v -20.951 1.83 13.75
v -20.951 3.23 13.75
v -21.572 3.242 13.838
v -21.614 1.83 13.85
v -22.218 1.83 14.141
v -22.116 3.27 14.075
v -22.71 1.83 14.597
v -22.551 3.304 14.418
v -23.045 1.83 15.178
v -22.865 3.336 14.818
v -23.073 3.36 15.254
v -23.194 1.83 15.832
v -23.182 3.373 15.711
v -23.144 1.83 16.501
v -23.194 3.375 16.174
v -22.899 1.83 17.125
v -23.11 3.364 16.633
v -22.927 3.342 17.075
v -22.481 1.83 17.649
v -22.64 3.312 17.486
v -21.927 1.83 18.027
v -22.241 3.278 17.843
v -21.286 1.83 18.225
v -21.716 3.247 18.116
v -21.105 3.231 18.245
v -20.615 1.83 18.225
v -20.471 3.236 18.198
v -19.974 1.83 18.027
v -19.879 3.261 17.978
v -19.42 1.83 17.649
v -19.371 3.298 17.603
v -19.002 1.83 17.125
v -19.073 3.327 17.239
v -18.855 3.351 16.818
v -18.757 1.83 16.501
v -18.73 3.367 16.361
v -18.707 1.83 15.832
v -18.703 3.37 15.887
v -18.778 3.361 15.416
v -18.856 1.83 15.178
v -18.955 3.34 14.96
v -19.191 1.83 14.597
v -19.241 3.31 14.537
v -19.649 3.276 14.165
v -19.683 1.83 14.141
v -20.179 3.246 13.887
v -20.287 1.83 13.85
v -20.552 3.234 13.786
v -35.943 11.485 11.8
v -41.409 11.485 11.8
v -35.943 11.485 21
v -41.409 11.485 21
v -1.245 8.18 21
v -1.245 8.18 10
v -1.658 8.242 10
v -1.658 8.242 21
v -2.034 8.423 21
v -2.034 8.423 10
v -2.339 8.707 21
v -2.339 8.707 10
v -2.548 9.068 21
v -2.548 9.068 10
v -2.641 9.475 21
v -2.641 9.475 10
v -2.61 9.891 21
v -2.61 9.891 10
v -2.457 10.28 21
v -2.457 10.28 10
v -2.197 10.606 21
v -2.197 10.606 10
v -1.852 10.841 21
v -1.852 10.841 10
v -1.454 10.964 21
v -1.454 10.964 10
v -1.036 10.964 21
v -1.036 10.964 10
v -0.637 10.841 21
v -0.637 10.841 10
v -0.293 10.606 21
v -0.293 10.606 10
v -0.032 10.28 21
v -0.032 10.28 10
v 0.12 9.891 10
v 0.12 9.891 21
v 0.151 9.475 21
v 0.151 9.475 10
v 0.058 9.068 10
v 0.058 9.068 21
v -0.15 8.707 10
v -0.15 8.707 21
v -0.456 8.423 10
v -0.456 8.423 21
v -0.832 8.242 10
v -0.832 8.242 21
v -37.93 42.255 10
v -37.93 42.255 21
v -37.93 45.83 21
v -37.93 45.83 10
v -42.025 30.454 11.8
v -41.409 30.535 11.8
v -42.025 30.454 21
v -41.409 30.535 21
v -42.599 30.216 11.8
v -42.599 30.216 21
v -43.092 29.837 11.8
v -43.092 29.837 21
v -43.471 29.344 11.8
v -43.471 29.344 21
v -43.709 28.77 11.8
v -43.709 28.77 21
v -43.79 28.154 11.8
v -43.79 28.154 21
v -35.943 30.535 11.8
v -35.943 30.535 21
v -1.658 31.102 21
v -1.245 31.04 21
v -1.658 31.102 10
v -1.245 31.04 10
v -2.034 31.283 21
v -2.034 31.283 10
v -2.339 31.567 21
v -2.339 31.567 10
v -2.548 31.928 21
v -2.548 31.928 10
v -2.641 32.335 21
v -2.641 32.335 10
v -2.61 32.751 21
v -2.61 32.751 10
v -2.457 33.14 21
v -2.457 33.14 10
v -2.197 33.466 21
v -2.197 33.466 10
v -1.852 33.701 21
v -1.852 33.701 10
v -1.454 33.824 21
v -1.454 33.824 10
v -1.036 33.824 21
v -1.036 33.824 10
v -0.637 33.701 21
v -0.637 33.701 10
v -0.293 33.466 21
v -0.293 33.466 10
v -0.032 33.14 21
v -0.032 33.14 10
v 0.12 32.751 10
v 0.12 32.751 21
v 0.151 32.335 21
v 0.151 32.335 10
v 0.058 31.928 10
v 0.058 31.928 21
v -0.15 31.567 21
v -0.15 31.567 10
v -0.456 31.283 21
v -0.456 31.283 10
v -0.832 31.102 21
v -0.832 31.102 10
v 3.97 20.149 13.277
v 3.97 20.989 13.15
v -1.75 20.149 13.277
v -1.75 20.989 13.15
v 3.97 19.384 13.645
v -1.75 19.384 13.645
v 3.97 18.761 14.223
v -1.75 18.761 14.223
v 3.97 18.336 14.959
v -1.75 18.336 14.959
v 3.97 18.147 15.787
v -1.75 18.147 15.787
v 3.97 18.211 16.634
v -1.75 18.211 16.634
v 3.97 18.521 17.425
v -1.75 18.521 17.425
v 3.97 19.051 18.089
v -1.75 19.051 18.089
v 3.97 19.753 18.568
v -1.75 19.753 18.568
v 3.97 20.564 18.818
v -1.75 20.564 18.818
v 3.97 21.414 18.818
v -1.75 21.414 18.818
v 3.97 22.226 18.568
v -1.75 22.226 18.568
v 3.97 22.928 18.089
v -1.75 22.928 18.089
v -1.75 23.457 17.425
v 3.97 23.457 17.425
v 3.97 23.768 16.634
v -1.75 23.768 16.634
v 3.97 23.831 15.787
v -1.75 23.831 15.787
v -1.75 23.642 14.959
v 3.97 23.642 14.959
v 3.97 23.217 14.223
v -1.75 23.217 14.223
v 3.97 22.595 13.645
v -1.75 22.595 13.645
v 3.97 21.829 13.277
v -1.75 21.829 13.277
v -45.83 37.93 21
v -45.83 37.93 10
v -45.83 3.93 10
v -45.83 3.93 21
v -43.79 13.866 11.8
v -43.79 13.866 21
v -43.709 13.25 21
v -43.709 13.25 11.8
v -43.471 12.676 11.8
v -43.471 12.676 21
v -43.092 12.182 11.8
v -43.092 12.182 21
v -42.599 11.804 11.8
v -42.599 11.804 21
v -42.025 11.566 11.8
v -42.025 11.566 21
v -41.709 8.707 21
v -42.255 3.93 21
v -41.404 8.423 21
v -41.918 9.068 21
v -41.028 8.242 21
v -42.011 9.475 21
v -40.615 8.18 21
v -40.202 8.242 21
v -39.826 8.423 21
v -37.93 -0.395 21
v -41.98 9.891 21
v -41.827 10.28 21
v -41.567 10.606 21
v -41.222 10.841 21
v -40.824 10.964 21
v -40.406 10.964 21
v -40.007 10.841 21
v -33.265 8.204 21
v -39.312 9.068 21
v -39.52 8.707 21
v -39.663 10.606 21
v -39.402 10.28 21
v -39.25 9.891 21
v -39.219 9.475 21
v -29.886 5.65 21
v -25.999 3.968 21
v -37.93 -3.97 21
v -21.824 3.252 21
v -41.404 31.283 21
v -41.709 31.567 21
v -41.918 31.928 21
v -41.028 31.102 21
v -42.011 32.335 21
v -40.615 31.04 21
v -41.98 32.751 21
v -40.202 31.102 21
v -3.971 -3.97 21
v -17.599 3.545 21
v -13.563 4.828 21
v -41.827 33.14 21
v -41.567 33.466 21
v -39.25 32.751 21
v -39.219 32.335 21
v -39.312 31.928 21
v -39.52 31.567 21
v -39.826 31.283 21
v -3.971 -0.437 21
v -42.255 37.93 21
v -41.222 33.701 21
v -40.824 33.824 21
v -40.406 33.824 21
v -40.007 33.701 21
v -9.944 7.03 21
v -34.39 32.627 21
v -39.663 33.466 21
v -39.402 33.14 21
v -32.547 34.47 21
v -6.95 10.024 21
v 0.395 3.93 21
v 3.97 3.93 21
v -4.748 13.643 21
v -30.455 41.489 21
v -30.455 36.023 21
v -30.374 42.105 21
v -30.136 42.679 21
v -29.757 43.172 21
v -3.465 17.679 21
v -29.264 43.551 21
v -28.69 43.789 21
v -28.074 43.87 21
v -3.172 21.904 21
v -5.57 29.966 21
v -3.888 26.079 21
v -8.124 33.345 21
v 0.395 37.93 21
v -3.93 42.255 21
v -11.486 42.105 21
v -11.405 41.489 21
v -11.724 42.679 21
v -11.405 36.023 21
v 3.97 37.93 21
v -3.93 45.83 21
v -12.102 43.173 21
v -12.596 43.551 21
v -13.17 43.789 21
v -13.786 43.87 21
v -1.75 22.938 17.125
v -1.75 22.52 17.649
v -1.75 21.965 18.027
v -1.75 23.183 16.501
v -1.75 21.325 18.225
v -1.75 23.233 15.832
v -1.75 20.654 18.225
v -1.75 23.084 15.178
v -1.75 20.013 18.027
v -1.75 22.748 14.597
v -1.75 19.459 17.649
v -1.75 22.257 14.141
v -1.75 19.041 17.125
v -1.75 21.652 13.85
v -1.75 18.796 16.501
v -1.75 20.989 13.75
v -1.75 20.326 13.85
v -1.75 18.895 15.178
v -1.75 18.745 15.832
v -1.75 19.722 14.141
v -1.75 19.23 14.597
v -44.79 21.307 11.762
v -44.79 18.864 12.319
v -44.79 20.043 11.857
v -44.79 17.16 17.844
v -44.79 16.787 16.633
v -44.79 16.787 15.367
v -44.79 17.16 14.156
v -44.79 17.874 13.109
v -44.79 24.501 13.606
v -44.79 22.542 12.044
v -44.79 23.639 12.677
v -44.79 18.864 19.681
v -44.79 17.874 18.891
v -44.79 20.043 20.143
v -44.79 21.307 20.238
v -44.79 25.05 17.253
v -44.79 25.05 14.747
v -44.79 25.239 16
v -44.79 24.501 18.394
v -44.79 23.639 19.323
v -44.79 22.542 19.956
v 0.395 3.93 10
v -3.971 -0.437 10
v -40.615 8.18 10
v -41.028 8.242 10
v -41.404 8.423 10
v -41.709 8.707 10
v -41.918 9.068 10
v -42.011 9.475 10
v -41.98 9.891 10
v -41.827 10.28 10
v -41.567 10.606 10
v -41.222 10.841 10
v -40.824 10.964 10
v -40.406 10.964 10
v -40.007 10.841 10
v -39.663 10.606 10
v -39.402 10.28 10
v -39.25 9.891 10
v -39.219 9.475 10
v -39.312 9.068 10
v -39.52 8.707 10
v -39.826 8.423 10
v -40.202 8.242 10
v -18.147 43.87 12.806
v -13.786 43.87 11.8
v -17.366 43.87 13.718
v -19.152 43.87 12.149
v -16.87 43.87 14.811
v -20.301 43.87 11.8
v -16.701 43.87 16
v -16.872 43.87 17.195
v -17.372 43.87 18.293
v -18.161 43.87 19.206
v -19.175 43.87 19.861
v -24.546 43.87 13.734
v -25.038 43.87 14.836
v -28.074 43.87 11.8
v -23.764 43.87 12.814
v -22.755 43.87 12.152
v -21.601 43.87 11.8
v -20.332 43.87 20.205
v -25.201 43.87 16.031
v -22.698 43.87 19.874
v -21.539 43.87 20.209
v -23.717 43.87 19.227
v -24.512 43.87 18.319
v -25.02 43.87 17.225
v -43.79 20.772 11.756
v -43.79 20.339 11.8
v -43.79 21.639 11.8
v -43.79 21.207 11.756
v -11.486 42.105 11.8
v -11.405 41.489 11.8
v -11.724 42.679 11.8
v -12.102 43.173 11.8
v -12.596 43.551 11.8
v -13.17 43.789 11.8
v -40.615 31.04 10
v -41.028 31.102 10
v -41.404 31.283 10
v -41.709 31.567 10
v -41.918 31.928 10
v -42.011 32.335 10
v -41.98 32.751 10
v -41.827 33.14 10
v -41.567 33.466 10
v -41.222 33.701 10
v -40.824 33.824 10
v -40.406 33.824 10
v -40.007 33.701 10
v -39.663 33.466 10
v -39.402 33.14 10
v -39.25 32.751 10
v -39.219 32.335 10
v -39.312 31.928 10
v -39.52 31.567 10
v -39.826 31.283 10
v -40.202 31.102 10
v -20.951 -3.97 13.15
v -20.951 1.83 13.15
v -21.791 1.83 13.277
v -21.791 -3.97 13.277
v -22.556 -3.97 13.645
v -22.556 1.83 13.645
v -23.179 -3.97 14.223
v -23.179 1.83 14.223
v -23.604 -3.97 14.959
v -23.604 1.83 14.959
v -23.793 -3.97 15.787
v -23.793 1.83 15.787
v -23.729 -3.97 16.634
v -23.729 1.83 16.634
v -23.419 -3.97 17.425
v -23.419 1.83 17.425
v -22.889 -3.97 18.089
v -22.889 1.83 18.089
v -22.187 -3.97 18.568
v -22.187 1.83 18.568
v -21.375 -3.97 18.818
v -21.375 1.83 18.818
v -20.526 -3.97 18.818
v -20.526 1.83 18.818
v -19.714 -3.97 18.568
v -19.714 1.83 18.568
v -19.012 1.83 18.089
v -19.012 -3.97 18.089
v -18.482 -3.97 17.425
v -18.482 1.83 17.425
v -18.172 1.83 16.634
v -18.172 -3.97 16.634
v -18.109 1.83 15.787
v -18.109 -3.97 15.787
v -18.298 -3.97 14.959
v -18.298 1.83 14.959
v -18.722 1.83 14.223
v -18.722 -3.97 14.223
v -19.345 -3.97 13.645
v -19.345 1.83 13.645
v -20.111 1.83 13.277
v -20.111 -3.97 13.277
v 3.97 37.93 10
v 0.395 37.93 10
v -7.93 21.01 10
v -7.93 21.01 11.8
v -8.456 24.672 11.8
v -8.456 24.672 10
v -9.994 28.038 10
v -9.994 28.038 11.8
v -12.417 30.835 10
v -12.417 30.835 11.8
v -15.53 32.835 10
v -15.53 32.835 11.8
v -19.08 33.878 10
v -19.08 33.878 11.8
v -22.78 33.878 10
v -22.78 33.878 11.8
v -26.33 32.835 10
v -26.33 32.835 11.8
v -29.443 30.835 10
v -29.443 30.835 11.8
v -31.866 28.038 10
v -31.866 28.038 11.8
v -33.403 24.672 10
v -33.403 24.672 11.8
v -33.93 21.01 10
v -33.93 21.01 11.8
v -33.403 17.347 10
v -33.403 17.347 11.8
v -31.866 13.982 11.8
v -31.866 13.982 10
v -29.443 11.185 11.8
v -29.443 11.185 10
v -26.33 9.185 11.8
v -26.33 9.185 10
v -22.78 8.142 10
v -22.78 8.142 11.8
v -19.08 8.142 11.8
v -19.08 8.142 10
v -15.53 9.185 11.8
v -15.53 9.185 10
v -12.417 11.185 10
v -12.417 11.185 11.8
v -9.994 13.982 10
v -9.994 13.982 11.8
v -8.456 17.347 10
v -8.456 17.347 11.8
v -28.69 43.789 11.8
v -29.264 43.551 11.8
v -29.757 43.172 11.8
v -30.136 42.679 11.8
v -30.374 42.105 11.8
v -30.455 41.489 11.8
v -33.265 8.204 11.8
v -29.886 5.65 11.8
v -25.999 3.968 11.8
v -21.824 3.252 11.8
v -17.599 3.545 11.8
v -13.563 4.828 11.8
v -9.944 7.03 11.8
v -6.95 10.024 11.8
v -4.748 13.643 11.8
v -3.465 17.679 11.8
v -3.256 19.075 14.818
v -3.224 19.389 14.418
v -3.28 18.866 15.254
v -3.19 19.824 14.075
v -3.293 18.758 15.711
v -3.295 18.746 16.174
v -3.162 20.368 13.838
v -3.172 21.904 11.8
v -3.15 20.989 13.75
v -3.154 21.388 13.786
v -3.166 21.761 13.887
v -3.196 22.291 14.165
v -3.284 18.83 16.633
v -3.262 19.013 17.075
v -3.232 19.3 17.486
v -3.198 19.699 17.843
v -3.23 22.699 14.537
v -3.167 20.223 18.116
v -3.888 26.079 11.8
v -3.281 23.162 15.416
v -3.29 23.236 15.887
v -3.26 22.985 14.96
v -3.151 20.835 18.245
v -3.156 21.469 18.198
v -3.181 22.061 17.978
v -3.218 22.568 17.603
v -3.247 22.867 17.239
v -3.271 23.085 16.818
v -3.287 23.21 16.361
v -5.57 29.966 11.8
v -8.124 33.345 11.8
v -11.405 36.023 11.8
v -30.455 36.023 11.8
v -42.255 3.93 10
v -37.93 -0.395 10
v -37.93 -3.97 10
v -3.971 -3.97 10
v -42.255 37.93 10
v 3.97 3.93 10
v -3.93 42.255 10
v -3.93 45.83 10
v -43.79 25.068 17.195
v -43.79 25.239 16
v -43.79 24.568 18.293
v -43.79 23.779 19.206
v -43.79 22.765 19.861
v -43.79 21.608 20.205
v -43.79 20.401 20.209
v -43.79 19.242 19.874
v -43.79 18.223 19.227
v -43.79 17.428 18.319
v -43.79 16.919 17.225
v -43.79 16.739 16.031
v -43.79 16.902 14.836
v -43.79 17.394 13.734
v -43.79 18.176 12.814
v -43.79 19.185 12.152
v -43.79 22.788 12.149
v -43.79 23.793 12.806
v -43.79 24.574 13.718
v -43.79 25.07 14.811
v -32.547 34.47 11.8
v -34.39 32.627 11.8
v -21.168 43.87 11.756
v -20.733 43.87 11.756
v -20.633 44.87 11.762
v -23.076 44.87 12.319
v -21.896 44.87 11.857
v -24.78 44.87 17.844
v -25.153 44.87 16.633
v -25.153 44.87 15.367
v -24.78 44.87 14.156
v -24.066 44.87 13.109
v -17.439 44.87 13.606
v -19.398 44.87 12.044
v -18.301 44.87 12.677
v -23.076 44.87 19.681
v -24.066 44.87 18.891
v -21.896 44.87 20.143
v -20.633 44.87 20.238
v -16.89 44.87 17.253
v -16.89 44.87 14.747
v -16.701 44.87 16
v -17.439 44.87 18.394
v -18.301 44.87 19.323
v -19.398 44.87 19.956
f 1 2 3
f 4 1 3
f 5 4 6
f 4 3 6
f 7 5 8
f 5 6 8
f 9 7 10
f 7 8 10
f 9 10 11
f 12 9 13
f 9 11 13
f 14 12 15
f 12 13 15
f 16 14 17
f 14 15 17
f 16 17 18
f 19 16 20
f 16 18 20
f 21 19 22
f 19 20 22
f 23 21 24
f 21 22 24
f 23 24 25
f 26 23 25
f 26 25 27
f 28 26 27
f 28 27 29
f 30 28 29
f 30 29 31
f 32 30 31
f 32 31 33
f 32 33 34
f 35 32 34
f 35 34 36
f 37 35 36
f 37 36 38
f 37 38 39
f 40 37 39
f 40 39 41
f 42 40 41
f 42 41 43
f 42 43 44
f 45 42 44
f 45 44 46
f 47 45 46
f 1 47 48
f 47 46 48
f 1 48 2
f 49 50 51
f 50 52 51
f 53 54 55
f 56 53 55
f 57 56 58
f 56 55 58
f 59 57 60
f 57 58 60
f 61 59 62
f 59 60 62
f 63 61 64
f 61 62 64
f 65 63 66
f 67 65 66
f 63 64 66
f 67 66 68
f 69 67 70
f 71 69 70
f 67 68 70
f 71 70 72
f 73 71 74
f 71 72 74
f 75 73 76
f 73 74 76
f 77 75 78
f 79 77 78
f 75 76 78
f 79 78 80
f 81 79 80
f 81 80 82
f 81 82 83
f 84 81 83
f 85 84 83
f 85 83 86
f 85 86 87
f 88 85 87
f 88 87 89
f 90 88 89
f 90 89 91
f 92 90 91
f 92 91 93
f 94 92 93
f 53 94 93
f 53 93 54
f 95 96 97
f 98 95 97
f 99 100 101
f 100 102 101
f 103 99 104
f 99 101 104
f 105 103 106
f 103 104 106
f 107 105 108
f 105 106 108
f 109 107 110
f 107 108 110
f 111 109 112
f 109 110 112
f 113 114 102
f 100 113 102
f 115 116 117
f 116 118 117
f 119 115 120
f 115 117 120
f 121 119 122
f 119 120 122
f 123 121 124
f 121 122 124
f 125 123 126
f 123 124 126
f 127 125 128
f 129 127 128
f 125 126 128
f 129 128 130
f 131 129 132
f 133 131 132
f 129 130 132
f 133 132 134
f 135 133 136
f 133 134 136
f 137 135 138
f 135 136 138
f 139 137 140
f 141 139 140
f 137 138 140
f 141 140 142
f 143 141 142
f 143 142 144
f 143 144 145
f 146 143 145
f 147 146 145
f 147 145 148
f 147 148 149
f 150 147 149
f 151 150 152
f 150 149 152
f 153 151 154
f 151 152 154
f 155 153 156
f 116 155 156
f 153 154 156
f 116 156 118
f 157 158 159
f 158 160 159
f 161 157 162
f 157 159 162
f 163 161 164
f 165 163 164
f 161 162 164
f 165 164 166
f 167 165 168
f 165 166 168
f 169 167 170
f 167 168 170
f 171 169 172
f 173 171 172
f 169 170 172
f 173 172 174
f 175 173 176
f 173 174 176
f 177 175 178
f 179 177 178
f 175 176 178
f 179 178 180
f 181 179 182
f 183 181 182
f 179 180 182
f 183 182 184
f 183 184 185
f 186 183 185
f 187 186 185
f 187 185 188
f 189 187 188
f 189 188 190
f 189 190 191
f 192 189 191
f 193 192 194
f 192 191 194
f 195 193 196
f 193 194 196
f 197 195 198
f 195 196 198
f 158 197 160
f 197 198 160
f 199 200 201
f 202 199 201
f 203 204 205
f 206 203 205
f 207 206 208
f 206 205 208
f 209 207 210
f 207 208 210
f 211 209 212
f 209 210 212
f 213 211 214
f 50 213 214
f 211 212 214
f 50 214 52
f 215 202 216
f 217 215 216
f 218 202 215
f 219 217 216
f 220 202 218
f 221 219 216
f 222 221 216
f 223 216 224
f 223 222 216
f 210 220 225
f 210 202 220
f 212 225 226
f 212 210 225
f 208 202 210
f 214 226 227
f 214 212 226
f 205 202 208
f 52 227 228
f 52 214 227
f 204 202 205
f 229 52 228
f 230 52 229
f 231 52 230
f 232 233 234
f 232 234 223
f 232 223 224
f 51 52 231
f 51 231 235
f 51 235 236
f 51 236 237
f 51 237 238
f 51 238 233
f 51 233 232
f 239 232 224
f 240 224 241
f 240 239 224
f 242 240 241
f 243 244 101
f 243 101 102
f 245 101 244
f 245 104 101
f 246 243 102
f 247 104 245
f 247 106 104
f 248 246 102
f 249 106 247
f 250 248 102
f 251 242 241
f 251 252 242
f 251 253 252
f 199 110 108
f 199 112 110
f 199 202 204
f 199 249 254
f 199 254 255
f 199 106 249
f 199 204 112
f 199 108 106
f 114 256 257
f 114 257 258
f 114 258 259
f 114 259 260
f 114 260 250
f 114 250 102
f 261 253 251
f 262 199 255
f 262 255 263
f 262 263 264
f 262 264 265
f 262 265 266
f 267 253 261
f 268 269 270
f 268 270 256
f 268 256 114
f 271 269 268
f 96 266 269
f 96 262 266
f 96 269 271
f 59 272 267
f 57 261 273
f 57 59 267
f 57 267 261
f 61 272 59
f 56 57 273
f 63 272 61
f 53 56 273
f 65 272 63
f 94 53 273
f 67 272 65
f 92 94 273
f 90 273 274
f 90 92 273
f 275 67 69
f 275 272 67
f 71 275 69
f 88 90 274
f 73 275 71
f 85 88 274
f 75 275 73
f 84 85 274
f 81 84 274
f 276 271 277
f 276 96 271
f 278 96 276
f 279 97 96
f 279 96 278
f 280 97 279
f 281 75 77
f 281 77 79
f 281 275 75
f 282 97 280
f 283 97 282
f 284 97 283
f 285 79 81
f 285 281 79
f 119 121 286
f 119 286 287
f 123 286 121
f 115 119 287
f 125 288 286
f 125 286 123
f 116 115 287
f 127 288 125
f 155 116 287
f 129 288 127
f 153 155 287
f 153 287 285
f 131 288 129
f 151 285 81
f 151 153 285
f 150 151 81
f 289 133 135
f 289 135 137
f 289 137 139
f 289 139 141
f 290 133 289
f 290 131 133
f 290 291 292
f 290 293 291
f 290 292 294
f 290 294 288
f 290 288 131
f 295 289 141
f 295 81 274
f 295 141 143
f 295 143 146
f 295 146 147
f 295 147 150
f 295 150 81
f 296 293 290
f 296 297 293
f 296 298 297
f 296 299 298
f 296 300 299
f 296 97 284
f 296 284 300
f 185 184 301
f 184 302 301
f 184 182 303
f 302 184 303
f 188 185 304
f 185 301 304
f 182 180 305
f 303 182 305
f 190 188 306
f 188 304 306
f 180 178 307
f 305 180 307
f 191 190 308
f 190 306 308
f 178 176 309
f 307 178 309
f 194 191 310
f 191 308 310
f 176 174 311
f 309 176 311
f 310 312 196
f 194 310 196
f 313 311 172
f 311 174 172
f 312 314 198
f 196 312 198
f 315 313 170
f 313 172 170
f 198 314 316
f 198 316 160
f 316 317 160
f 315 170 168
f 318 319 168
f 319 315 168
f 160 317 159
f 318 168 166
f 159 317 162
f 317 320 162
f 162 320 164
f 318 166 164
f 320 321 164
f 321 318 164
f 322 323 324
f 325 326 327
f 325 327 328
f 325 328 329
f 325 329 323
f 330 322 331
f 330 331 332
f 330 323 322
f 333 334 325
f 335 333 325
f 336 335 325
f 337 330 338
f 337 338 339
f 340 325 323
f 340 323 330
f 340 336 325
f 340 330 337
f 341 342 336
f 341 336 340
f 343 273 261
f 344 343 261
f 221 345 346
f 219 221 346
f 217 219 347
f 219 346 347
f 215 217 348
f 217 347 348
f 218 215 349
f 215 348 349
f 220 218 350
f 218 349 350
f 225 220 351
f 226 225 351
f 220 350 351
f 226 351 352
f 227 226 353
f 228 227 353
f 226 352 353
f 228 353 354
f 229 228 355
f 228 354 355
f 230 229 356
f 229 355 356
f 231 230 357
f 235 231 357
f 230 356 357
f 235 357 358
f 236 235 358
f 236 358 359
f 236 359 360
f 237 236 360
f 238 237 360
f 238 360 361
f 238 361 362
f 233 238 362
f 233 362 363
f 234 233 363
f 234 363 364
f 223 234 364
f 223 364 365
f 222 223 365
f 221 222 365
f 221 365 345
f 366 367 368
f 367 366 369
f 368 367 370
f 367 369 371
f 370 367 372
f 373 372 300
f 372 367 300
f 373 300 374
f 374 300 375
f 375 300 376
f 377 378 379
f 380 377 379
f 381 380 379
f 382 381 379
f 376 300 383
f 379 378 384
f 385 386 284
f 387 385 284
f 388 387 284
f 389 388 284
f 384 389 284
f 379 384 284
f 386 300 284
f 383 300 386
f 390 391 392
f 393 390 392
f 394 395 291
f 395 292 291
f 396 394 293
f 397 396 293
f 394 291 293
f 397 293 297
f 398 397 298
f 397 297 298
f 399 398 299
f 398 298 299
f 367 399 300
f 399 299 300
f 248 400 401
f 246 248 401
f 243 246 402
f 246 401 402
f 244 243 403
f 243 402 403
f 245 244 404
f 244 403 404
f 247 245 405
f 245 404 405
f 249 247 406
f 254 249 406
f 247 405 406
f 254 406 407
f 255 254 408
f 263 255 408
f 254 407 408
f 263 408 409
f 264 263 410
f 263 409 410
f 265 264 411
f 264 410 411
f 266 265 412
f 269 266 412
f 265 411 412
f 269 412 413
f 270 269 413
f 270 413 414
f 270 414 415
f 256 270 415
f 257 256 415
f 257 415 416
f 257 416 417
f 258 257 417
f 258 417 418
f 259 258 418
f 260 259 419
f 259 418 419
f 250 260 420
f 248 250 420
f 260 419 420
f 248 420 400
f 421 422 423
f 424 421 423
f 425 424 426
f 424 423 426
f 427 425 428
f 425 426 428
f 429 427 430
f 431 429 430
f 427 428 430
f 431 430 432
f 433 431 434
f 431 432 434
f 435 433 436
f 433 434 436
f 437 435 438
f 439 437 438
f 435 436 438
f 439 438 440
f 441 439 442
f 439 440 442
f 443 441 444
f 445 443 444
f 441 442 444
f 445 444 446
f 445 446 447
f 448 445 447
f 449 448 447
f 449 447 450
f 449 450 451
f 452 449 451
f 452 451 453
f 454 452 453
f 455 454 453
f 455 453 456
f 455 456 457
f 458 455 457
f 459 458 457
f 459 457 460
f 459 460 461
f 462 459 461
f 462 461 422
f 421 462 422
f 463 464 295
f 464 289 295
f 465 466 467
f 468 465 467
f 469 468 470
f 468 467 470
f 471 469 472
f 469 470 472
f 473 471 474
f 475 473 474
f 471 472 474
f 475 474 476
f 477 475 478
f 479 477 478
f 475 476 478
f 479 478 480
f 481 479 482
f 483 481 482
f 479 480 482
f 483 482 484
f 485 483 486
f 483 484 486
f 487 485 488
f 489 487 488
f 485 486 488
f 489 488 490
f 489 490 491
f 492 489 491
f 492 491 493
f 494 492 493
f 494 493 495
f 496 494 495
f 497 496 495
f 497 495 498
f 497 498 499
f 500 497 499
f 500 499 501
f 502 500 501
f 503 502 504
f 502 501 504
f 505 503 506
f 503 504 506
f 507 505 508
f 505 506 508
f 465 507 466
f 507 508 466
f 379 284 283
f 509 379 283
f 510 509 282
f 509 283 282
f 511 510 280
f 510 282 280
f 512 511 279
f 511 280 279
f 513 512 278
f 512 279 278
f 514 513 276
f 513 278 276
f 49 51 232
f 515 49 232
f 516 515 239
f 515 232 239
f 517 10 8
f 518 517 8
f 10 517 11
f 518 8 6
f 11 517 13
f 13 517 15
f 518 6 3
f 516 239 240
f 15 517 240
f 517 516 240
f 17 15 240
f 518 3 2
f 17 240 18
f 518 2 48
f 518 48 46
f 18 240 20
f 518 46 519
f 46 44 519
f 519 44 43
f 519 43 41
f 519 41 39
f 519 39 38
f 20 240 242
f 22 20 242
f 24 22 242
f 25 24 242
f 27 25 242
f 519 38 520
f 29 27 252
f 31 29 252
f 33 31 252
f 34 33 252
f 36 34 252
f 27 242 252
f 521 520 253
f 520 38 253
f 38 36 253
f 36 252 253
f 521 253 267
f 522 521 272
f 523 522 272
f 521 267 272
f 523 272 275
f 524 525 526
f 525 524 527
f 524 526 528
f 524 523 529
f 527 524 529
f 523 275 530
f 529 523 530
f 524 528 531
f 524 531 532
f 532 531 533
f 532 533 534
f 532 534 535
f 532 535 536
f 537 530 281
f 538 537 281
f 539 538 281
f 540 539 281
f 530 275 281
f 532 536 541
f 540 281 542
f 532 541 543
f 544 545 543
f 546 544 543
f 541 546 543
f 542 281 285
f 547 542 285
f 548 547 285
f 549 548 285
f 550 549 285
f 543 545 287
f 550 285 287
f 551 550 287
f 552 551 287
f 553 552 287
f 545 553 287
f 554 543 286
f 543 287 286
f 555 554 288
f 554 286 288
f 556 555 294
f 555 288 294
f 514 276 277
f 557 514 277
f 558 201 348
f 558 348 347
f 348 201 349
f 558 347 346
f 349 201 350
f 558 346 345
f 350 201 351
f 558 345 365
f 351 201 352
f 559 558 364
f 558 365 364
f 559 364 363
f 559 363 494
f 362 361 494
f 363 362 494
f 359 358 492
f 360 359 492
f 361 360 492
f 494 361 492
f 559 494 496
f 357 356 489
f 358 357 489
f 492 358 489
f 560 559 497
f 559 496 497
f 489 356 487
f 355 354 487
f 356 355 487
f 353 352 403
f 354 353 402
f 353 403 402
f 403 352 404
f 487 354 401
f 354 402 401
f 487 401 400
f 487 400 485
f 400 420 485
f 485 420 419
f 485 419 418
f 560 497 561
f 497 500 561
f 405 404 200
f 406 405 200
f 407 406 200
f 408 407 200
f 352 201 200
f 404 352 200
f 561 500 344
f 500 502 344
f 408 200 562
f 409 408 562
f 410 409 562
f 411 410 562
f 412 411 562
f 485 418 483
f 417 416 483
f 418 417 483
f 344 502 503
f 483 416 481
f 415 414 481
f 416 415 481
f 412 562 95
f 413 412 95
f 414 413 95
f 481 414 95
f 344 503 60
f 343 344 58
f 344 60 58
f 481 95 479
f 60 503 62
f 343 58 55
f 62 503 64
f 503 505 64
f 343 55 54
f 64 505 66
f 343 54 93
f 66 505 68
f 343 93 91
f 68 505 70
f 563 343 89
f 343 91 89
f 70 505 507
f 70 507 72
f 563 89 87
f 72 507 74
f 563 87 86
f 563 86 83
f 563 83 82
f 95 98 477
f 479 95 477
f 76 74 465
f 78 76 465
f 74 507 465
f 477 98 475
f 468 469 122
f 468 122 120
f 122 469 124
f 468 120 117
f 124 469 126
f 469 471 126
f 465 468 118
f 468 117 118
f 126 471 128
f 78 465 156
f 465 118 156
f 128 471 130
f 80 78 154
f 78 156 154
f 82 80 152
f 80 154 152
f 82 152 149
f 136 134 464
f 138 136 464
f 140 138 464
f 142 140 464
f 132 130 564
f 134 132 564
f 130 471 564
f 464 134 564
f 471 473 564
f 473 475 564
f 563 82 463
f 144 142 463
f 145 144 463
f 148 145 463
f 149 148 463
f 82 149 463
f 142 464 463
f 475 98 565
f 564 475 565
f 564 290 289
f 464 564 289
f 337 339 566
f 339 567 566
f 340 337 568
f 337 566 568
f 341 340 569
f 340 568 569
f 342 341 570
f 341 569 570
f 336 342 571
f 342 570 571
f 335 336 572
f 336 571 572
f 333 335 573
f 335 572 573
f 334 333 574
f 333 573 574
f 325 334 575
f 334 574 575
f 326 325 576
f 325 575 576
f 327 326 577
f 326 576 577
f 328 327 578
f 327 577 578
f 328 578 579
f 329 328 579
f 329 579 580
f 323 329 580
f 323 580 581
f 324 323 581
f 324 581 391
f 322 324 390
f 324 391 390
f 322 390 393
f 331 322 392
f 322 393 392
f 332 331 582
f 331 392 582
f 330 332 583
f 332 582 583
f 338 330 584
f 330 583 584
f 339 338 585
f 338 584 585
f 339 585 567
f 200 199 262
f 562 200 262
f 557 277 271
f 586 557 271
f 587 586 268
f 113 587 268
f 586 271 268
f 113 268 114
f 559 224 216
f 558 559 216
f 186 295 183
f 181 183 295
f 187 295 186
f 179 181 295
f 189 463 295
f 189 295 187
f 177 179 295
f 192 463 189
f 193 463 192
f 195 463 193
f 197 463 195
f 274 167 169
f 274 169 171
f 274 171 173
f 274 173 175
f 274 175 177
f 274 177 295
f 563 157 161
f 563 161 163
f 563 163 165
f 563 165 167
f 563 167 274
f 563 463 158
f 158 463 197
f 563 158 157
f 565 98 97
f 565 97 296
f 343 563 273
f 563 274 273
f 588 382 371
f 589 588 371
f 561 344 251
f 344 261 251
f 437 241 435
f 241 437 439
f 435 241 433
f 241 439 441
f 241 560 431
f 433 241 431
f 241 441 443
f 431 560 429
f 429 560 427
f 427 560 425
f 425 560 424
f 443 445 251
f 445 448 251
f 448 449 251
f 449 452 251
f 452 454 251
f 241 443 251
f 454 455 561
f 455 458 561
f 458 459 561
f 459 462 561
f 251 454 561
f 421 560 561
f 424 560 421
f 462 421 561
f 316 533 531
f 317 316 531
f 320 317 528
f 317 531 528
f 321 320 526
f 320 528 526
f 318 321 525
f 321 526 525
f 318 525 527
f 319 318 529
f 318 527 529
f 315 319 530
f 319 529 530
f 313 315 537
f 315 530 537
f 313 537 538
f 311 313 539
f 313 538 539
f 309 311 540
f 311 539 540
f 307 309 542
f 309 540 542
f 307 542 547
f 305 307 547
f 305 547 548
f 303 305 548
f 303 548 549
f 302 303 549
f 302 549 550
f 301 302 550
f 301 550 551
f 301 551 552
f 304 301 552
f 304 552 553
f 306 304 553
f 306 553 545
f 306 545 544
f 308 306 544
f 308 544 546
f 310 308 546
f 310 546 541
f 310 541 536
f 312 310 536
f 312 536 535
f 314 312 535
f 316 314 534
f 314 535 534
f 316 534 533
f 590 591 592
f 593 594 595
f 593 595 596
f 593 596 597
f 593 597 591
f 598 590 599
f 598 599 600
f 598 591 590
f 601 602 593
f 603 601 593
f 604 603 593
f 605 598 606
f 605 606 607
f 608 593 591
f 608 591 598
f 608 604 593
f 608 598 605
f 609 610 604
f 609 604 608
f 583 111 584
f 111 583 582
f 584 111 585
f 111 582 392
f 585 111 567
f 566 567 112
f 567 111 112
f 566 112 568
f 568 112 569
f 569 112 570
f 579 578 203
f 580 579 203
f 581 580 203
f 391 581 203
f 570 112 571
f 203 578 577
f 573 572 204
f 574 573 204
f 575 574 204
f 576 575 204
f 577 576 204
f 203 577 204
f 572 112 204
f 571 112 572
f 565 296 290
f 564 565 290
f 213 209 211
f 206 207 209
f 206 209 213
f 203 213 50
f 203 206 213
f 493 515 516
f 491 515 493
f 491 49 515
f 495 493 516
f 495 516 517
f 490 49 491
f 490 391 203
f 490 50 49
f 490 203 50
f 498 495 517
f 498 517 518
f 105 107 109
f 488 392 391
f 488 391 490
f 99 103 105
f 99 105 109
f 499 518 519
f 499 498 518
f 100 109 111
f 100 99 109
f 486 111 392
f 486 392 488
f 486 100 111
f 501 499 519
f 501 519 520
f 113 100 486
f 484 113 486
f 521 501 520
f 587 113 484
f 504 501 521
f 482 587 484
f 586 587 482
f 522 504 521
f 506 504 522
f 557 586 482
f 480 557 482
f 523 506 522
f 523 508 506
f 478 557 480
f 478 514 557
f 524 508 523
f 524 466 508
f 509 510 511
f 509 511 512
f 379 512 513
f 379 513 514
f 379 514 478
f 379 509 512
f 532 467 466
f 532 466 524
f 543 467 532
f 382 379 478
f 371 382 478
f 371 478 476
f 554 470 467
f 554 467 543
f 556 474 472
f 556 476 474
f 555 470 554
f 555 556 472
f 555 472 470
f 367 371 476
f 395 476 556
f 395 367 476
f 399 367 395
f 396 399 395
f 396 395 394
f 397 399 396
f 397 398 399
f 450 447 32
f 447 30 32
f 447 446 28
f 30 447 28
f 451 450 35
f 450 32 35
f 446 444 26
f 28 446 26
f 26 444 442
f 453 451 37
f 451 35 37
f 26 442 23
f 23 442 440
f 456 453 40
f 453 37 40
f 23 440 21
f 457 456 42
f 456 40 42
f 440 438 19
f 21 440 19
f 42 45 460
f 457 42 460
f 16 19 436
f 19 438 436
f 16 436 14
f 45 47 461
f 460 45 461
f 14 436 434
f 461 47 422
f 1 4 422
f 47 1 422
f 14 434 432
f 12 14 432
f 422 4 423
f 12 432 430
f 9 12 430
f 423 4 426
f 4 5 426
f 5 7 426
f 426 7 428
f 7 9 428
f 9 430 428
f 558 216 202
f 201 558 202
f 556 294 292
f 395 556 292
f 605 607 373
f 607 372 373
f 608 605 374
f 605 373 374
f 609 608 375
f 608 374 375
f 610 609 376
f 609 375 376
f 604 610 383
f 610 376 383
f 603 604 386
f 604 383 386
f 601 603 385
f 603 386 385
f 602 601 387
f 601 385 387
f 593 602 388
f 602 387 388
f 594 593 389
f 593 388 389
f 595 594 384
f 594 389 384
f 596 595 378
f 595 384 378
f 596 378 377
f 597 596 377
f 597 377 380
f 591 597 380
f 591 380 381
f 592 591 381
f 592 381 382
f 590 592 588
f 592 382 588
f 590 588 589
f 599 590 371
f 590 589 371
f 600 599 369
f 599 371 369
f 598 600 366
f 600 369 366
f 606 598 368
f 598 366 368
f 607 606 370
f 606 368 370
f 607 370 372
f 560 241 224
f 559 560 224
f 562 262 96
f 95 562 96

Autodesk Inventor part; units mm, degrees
ref_plane "YZ Plane" through (0, 0, 0) normal (1, 0, 0) x (0, 1, 0)
ref_plane "XZ Plane" through (0, 0, 0) normal (0, 1, 0) x (-1, 0, 0)
ref_plane "Work Plane1" through (0, 0, 10) normal (0, 0, 1) x (1, 0, 0)
sketch "Sketch1" plane through (0, 0, 10) normal (0, 0, 1) x (1, 0, 0)
  line L0 (-4.0299, -0.3538) -> (-2.2322, 1.4439) construction
  arc A0 (-1.4439, 2.2322) -> (-2.2322, 1.4439) centre (-0.9299, 0.9299) ccw construction
  line L1 (-1.4439, 2.2322) -> (0.3538, 4.0299) construction
  line L2 (-37.8299, 42.8299) -> (-37.8299, 37.8299) construction
  line L3 (-37.8299, 37.8299) -> (-42.9208, 37.8299) construction
  line L4 (-37.8299, 42.2137) -> (-37.8299, 45.8299) construction
  line L5 (-37.8299, 45.8299) -> (-4.0299, 45.8299) construction
  line L6 (-4.0299, 45.8299) -> (-4.0299, 42.2137) construction
  line L7 (-4.0299, 4.0299) -> (0.3538, 4.0299) projected
  circle A1 centre (-20.9299, 20.9299) radius 17.5 projected
  line L8 (-20.9299, 58.9723) -> (17.1124, 20.9299) construction
  line L9 (17.1124, 20.9299) -> (-20.9299, -17.1124) construction
  line L10 (-20.9299, -17.1124) -> (-58.9723, 20.9299) construction
  line L11 (-58.9723, 20.9299) -> (-20.9299, 58.9723) construction
  line L12 (-20.9299, 58.9723) -> (-20.9299, -17.1124) construction
  line L13 (17.1124, 20.9299) -> (-58.9723, 20.9299) construction
  line L14 (-20.9299, 58.9723) -> (32.8701, 58.9723) construction
  line L15 (-43.4299, 43.4299) -> (1.5701, 43.4299) construction
  line L16 (1.5701, 43.4299) -> (1.5701, -1.5701) construction
  line L17 (1.5701, -1.5701) -> (-43.4299, -1.5701) construction
  line L18 (-43.4299, -1.5701) -> (-43.4299, 43.4299) construction
  line L19 (-43.4299, 43.4299) -> (1.5701, -1.5701) construction
  line L20 (1.5701, 43.4299) -> (-43.4299, -1.5701) construction
  line L21 (-43.4299, 5.3876) -> (-43.4299, 36.4723)
  line L22 (-43.4299, 36.4723) -> (-36.4723, 43.4299)
  line L23 (-36.4723, 43.4299) -> (-5.3876, 43.4299)
  line L24 (-5.3876, 43.4299) -> (1.5701, 36.4723)
  line L25 (1.5701, 36.4723) -> (1.5701, 5.3876)
  line L26 (1.5701, 5.3876) -> (-5.3876, -1.5701)
  line L27 (-5.3876, -1.5701) -> (-36.4723, -1.5701)
  line L28 (-36.4723, -1.5701) -> (-43.4299, 5.3876)
  line L29 (-4.0299, 42.2137) -> (-37.8299, 42.2137) projected
  line L30 (-4.0299, -0.3538) -> (-4.0299, 4.0299) projected
  circle A2 centre (-20.9299, 20.9299) radius 1.5
  line L31 (-10.9299, 10.9299) -> (-30.9299, 10.9299) construction
  line L32 (-30.9299, 10.9299) -> (-30.9299, 30.9299) construction
  line L33 (-30.9299, 30.9299) -> (-10.9299, 30.9299) construction
  line L34 (-10.9299, 30.9299) -> (-10.9299, 10.9299) construction
  line L35 (-10.9299, 10.9299) -> (-30.9299, 30.9299) construction
  line L36 (-30.9299, 10.9299) -> (-10.9299, 30.9299) construction
  circle A3 centre (-30.9299, 30.9299) radius 1.4
  circle A4 centre (-30.9299, 10.9299) radius 1.4
  circle A5 centre (-10.9299, 10.9299) radius 1.4
  line L37 (-45.8299, 37.8299) -> (-42.0723, 37.8299) construction
  line L38 (-42.1723, 37.7299) -> (-45.8299, 37.7299)
  line L39 (-45.8299, 37.7299) -> (-45.8299, 4.1299)
  line L40 (-45.8299, 4.1299) -> (-42.1723, 4.1299)
  line L41 (-42.1723, 4.1299) -> (-42.1723, 37.7299)
  line L42 (-45.8299, 4.0299) -> (-42.0723, 4.0299) construction
  line L43 (-45.8299, 37.8299) -> (-42.0723, 37.8299) projected
  line L44 (-37.7299, 45.8299) -> (-4.1299, 45.8299)
  line L45 (-4.1299, 45.8299) -> (-4.1299, 42.1723)
  line L46 (-4.1299, 42.1723) -> (-37.7299, 42.1723)
  line L47 (-37.7299, 42.1723) -> (-37.7299, 45.8299)
  line L48 (0.4701, 37.8299) -> (0.4701, 4.0299) construction
  line L49 (0.4701, 4.0299) -> (3.9701, 4.0299) construction
  line L50 (3.9701, 37.8299) -> (3.9701, 4.0299) construction
  line L51 (0.4701, 37.8299) -> (3.9701, 37.8299) construction
  line L52 (-45.8299, -3.9701) -> (-4.0299, -3.9701) construction
  line L53 (0.3124, 37.7299) -> (3.9701, 37.7299)
  line L54 (3.9701, 37.7299) -> (3.9701, 4.1299)
  line L55 (3.9701, 4.1299) -> (0.3124, 4.1299)
  line L56 (0.3124, 4.1299) -> (0.3124, 37.7299)
  line L57 (-4.1713, -0.3538) -> (-37.7299, -0.3538)
  line L58 (-37.7299, -0.3538) -> (-37.7299, -3.9701)
  line L59 (-37.7299, -3.9701) -> (-4.1713, -3.9701)
  line L60 (-4.1713, -3.9701) -> (-4.1713, -0.3538)
  point P0 (-37.8299, 4.0299)
  dimension "d18" = 53.8
  dimension "d19" = 45
  dimension "d20" = 53.8
  dimension "d21" = 45
  dimension "d22" = 45
  dimension "d30" = 20
  dimension "d31" = 20
  dimension "d32" = 2.8
  dimension "d33" = 2.8
  dimension "d34" = 2.8
  dimension "d35" = 3
  dimension "d36" = 0.1
  dimension "d37" = 0.1
  dimension "d38" = 0.1
  dimension "d39" = 0.1
extrude "Extrusion1" add sketch "Sketch1" along normal blind 11 contours L30 L26 L57 L28 L41 L22 L46 L24 L56 L7 | L7 L26 L30 | L56 L24 L25 L26 | L26 L25 L24 L53 L54 L55 | L60 L59 L58 L57 L28 L27 L26 | L26 L27 L28 L57 | L46 L22 L29 L24 | L24 L29 L45 | L40 L39 L38 L22 L21 L28 | L28 L21 L22 L41 | L29 L22 L23 L24 | L24 L23 L22 L29 L47 L44 L45 | L47 L29 L22 | A1 | A2 | A3 | A4 | A5
sketch "Skizze4" plane through (0, 0, 21) normal (0, 0, 1) x (1, 0, 0)
  line L0 (-37.7299, 42.1723) -> (-42.1723, 37.7299) projected
  line L1 (-42.1723, 37.7299) -> (-45.8299, 37.7299) projected
  line L2 (-45.8299, 37.7299) -> (-45.8299, 4.1299) construction
  line L3 (-45.8299, 4.1299) -> (-42.1723, 4.1299) projected
  line L4 (-42.1723, 4.1299) -> (-37.6885, -0.3538) projected
  line L5 (-37.6885, -0.3538) -> (-37.7299, -0.3538) projected
  line L6 (-37.7299, -0.3538) -> (-37.7299, -3.9701) projected
  line L7 (-37.7299, -3.9701) -> (-4.1713, -3.9701) construction
  line L8 (-4.1713, -3.9701) -> (-4.1713, -0.3538) projected
  line L9 (-4.1713, -0.3538) -> (0.3124, 4.1299) projected
  line L10 (0.3124, 4.1299) -> (3.9701, 4.1299) projected
  line L11 (3.9701, 4.1299) -> (3.9701, 37.7299) construction
  line L12 (3.9701, 37.7299) -> (0.3124, 37.7299) projected
  line L13 (0.3124, 37.7299) -> (-4.1299, 42.1723) projected
  line L14 (-4.1299, 42.1723) -> (-4.1299, 45.8299) projected
  line L15 (-4.1299, 45.8299) -> (-37.7299, 45.8299) construction
  line L16 (-37.7299, 45.8299) -> (-37.7299, 42.1723) projected
  line L17 (-37.9299, 46.0299) -> (-3.9299, 46.0299) construction
  line L18 (-3.9299, 46.0299) -> (-3.9299, 42.2551)
  line L19 (-3.9299, 42.2551) -> (0.3953, 37.9299)
  line L20 (0.3953, 37.9299) -> (4.1701, 37.9299)
  line L21 (4.1701, 37.9299) -> (4.1701, 3.9299) construction
  line L22 (4.1701, 3.9299) -> (0.3953, 3.9299)
  line L23 (0.3953, 3.9299) -> (-3.9713, -0.4367)
  line L24 (-3.9713, -0.4367) -> (-3.9713, -4.1701)
  line L25 (-3.9713, -4.1701) -> (-37.9299, -4.1701) construction
  line L26 (-37.9299, -4.1701) -> (-37.9299, -0.3953)
  line L27 (-37.9299, -0.3953) -> (-42.2551, 3.9299)
  line L28 (-42.2551, 3.9299) -> (-46.0299, 3.9299)
  line L29 (-46.0299, 3.9299) -> (-46.0299, 37.9299) construction
  line L30 (-46.0299, 37.9299) -> (-42.2551, 37.9299)
  line L31 (-42.2551, 37.9299) -> (-37.9299, 42.2551)
  line L32 (-37.9299, 42.2551) -> (-37.9299, 46.0299)
  line L33 (-45.8299, 37.7299) -> (-45.8299, 37.9299)
  line L34 (-4.1299, 45.8299) -> (-37.7299, 45.8299) projected
  line L35 (-37.7299, 45.8299) -> (-37.9299, 45.8299)
  line L36 (-4.1299, 45.8299) -> (-3.9299, 45.8299)
  line L37 (3.9701, 37.7299) -> (3.9701, 37.9299)
  line L38 (3.9701, 4.1299) -> (3.9701, 37.7299) projected
  line L39 (3.9701, 4.1299) -> (3.9701, 3.9299)
  line L40 (-4.1713, -3.9701) -> (-3.9713, -3.9701)
  line L41 (-37.7299, -3.9701) -> (-37.9299, -3.9701)
  line L42 (-45.8299, 4.1299) -> (-45.8299, 3.9299)
  point P0 (0, 0)
  dimension "d40" = 0.2
extrude "IM_offset" add sketch "Skizze4" against normal up to surface (11 mm away)
ref_plane "Arbeitsebene5" through (-20.9299, 3.9299, 10) normal (1, 0, 0) x (0, 0, -1)
ref_plane "Arbeitsebene6" through (-37.9299, 20.9299, 10) normal (0, 1, 0) x (1, 0, 0)
sketch "Skizze25" plane through (0, 0, 21) normal (0, 0, 1) x (1, 0, 0)
  arc A0 (-35.9433, 11.4849) -> (-11.4049, 36.0233) centre (-20.9299, 21.0099) ccw projected
  circle A1 centre (-20.9299, 21.0099) radius 17.78
  circle A2 centre (-20.9299, 21.0099) radius 13
  point P0 (0, 0)
  point P1 (-11.4049, 36.0233)
  dimension "d152" = 26
extrude "Extrusion21" cut sketch "Skizze25" against normal blind 12 contours A2
sketch "Skizze26" plane through (0, 0, 21) normal (0, 0, 1) x (1, 0, 0)
  line L0 (-43.7899, 28.1537) -> (-43.7899, 13.8662) projected
  arc A0 (-43.7899, 13.8662) -> (-41.4087, 11.4849) centre (-41.4087, 13.8662) ccw projected
  line L1 (-41.4087, 11.4849) -> (-35.9433, 11.4849) projected
  arc A1 (-35.9433, 11.4849) -> (-11.4049, 36.0233) centre (-20.9299, 21.0099) ccw projected
  line L2 (-11.4049, 36.0233) -> (-11.4049, 41.4887) projected
  arc A2 (-11.4049, 41.4887) -> (-13.7862, 43.8699) centre (-13.7862, 41.4887) ccw projected
  line L3 (-13.7862, 43.8699) -> (-28.0737, 43.8699) projected
  arc A3 (-28.0737, 43.8699) -> (-30.4549, 41.4887) centre (-28.0737, 41.4887) ccw projected
  line L4 (-30.4549, 41.4887) -> (-30.4549, 36.0233) projected
  arc A4 (-30.4549, 36.0233) -> (-35.9433, 30.5349) centre (-20.9299, 21.0099) ccw projected
  line L5 (-35.9433, 30.5349) -> (-41.4087, 30.5349) projected
  arc A5 (-41.4087, 30.5349) -> (-43.7899, 28.1537) centre (-41.4087, 28.1537) ccw projected
  circle A6 centre (-20.9299, 21.0099) radius 13.2911 projected
  point P0 (0, 0)
extrude "Extrusion22" cut sketch "Skizze26" against normal blind 9.2 contours A5 L5 A4 L4 A3 L3 A2 L2 A1 L1 A0 L0 | A6
sketch "Skizze27" plane through (-37.9299, -3.9701, 10) normal (0, -1, 0) x (1, 0, 0)
  line L0 (33.9586, 0) -> (0, 0) projected
  line L1 (33.9586, 11) -> (33.9586, 0) projected
  line L2 (33.9586, 11) -> (0, 11) projected
  line L3 (0, 11) -> (0, 0) projected
  circle A0 centre (16.9793, 6) radius 2.85
  point P0 (37.9299, -10)
  dimension "d155" = 5.7
hole "Bohrung1" at (-20.9506, -3.9701, 16) direction (0, 1, 0) diameter 4.5 depth 30 tip angle 118 counterbore diameter 5.7 counterbore depth 5.8
sketch "Skizze28" plane through (0, 0, 21) normal (0, 0, 1) x (1, 0, 0)
  line L0 (-35.9433, 11.4849) -> (-41.4087, 11.4849) projected
  arc A0 (-43.7899, 13.8662) -> (-41.4087, 11.4849) centre (-41.4087, 13.8662) ccw projected
  line L1 (-43.7899, 13.8662) -> (-43.7899, 28.1537) projected
  arc A1 (-41.4087, 30.5349) -> (-43.7899, 28.1537) centre (-41.4087, 28.1537) ccw projected
  line L2 (-41.4087, 30.5349) -> (-35.9433, 30.5349) projected
  arc A2 (-30.4549, 36.0233) -> (-35.9433, 30.5349) centre (-20.9299, 21.0099) ccw projected
  line L3 (-30.4549, 36.0233) -> (-30.4549, 41.4887) projected
  arc A3 (-28.0737, 43.8699) -> (-30.4549, 41.4887) centre (-28.0737, 41.4887) ccw projected
  line L4 (-28.0737, 43.8699) -> (-13.7862, 43.8699) projected
  arc A4 (-11.4049, 41.4887) -> (-13.7862, 43.8699) centre (-13.7862, 41.4887) ccw projected
  line L5 (-11.4049, 41.4887) -> (-11.4049, 36.0233) projected
  arc A5 (-35.9433, 11.4849) -> (-11.4049, 36.0233) centre (-20.9299, 21.0099) ccw projected
  line L6 (3.9701, 3.9299) -> (3.9701, 37.9299) projected
  line L7 (3.9701, 37.9299) -> (0.3953, 37.9299) projected
  line L8 (0.3953, 37.9299) -> (-3.9299, 42.2551) projected
  line L9 (-3.9299, 42.2551) -> (-3.9299, 45.8299) projected
  line L10 (-3.9299, 45.8299) -> (-37.9299, 45.8299) projected
  line L11 (-37.9299, 45.8299) -> (-37.9299, 42.2551) projected
  line L12 (-37.9299, 42.2551) -> (-42.2551, 37.9299) projected
  line L13 (-42.2551, 37.9299) -> (-45.8299, 37.9299) projected
  line L14 (-45.8299, 37.9299) -> (-45.8299, 3.9299) projected
  line L15 (-42.2551, 3.9299) -> (-45.8299, 3.9299) projected
  line L16 (-37.9299, -0.3953) -> (-42.2551, 3.9299) projected
  line L17 (-37.9299, -3.9701) -> (-37.9299, -0.3953) projected
  line L18 (-3.9713, -3.9701) -> (-37.9299, -3.9701) projected
  line L19 (-3.9713, -3.9701) -> (-3.9713, -0.4367) projected
  line L20 (-3.9713, -0.4367) -> (0.3953, 3.9299) projected
  line L21 (0.3953, 3.9299) -> (3.9701, 3.9299) projected
  circle A6 centre (-1.2449, 9.5799) radius 2.0828 projected
  circle A7 centre (-1.2449, 32.4399) radius 2.0828 projected
  circle A8 centre (-40.6149, 32.4399) radius 2.0828 projected
  circle A9 centre (-40.6149, 9.5799) radius 2.0828 projected
  point P0 (0, 0)
hole "Bohrung2" at (-40.6149, 9.5799, 21) at (-40.6149, 32.4399, 21) at (-1.2449, 32.4399, 21) at (-1.2449, 9.5799, 21) direction (0, 0, -1) diameter 2.8 depth 30 tip angle 118
sketch "Skizze29" plane through (-28.0737, 43.8699, 21) normal (0, -1, 0) x (1, 0, 0)
  circle A0 centre (7.123, -5) radius 2.85 projected
  circle A1 centre (7.123, -5) radius 4.25
  point P0 (28.0737, -21)
  dimension "d173" = 8.5
extrude "Extrusion23" cut sketch "Skizze29" against normal blind 1 contours A0 | A1
pattern_circular "Runde Anordnung1" count 2 over 90 about axis through (-20.9299, 21.0099, 21) along (0, 0, 1) of "Bohrung1", "Extrusion23"
properties part number "20_Cube_Insert_Filter_25mm"
